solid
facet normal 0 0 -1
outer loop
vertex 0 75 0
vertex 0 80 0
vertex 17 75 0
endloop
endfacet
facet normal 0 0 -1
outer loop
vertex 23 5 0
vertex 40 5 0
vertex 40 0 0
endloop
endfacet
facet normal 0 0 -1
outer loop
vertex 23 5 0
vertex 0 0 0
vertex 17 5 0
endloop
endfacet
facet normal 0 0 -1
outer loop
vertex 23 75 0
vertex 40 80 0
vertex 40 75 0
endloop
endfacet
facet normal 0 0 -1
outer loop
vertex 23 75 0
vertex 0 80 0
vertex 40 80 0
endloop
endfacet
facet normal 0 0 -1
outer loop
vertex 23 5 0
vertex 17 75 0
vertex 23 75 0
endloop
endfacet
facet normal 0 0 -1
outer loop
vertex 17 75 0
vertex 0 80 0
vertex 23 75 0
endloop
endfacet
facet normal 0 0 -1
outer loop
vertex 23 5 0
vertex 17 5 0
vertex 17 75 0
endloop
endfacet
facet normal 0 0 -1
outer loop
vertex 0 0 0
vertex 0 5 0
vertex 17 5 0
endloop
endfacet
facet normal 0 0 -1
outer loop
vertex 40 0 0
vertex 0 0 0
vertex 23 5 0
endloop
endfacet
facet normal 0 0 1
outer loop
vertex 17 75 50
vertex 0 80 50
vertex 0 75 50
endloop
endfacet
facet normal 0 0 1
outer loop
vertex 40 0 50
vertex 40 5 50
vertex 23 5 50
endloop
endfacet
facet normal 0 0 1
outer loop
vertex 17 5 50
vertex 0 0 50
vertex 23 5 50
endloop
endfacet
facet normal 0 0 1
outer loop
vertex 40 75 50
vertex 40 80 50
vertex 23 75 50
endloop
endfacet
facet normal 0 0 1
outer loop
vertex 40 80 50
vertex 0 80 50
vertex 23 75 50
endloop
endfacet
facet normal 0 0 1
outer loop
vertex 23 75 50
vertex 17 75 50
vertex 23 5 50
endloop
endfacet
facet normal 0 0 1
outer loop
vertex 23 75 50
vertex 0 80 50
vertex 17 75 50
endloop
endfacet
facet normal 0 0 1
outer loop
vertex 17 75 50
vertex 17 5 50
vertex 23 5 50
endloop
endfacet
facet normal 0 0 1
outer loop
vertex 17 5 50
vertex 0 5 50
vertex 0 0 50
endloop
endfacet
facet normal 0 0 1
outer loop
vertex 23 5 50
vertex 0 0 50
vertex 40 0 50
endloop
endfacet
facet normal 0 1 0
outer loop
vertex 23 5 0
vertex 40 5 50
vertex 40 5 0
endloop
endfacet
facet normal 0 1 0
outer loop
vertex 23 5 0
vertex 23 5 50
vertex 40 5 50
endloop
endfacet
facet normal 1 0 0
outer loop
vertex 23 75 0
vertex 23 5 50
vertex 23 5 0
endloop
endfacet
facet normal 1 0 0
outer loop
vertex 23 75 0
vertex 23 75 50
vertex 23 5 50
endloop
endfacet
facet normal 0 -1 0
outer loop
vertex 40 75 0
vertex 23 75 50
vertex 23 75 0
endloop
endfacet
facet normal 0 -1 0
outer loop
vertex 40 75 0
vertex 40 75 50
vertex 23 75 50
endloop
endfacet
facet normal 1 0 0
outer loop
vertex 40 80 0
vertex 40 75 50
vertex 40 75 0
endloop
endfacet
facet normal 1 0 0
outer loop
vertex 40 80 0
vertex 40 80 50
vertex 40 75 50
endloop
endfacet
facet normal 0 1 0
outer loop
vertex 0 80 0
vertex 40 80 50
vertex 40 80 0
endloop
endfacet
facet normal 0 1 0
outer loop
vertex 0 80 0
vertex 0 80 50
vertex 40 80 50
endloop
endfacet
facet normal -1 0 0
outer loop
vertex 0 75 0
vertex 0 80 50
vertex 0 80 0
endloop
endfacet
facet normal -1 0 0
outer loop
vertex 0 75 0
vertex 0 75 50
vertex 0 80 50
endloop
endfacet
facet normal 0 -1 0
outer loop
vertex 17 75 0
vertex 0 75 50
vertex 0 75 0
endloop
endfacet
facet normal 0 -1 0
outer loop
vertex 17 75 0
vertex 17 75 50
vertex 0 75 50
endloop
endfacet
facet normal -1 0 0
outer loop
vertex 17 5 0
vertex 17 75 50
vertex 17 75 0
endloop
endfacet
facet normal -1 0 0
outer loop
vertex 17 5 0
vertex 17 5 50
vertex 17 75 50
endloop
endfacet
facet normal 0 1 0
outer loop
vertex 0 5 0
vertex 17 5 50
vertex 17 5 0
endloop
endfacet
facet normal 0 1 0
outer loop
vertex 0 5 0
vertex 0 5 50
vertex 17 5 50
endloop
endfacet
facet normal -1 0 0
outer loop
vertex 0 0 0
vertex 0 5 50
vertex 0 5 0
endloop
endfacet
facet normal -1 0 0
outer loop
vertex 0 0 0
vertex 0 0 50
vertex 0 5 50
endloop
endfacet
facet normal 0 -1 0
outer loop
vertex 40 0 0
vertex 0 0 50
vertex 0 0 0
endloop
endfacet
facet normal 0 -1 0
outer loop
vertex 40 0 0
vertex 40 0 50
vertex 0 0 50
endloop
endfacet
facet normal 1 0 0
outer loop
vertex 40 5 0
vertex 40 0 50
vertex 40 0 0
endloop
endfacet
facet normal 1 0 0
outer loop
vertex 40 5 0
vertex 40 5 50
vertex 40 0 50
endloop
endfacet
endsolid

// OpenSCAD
$fn = 32;

// ----------------------------------------------------------------------
// Structural section: ibeam 40 x 80 mm
// ----------------------------------------------------------------------

// --- parameters (mm) ---
sec_w = 40;               // section width, X
sec_h = 80;               // section height, Y
flange_t = 5;             // flange thickness
web_t = 6;                // web thickness
plate_t = 50;             // cut length, Z (extrusion height)

profile = [[0, 0], [40, 0], [40, 5], [23, 5], [23, 75], [40, 75], [40, 80], [0, 80], [0, 75], [17, 75], [17, 5], [0, 5]];  // primary outline, 12 points, counter clockwise

// --- the one profile operation ---
linear_extrude(height = plate_t) polygon(points = profile);
